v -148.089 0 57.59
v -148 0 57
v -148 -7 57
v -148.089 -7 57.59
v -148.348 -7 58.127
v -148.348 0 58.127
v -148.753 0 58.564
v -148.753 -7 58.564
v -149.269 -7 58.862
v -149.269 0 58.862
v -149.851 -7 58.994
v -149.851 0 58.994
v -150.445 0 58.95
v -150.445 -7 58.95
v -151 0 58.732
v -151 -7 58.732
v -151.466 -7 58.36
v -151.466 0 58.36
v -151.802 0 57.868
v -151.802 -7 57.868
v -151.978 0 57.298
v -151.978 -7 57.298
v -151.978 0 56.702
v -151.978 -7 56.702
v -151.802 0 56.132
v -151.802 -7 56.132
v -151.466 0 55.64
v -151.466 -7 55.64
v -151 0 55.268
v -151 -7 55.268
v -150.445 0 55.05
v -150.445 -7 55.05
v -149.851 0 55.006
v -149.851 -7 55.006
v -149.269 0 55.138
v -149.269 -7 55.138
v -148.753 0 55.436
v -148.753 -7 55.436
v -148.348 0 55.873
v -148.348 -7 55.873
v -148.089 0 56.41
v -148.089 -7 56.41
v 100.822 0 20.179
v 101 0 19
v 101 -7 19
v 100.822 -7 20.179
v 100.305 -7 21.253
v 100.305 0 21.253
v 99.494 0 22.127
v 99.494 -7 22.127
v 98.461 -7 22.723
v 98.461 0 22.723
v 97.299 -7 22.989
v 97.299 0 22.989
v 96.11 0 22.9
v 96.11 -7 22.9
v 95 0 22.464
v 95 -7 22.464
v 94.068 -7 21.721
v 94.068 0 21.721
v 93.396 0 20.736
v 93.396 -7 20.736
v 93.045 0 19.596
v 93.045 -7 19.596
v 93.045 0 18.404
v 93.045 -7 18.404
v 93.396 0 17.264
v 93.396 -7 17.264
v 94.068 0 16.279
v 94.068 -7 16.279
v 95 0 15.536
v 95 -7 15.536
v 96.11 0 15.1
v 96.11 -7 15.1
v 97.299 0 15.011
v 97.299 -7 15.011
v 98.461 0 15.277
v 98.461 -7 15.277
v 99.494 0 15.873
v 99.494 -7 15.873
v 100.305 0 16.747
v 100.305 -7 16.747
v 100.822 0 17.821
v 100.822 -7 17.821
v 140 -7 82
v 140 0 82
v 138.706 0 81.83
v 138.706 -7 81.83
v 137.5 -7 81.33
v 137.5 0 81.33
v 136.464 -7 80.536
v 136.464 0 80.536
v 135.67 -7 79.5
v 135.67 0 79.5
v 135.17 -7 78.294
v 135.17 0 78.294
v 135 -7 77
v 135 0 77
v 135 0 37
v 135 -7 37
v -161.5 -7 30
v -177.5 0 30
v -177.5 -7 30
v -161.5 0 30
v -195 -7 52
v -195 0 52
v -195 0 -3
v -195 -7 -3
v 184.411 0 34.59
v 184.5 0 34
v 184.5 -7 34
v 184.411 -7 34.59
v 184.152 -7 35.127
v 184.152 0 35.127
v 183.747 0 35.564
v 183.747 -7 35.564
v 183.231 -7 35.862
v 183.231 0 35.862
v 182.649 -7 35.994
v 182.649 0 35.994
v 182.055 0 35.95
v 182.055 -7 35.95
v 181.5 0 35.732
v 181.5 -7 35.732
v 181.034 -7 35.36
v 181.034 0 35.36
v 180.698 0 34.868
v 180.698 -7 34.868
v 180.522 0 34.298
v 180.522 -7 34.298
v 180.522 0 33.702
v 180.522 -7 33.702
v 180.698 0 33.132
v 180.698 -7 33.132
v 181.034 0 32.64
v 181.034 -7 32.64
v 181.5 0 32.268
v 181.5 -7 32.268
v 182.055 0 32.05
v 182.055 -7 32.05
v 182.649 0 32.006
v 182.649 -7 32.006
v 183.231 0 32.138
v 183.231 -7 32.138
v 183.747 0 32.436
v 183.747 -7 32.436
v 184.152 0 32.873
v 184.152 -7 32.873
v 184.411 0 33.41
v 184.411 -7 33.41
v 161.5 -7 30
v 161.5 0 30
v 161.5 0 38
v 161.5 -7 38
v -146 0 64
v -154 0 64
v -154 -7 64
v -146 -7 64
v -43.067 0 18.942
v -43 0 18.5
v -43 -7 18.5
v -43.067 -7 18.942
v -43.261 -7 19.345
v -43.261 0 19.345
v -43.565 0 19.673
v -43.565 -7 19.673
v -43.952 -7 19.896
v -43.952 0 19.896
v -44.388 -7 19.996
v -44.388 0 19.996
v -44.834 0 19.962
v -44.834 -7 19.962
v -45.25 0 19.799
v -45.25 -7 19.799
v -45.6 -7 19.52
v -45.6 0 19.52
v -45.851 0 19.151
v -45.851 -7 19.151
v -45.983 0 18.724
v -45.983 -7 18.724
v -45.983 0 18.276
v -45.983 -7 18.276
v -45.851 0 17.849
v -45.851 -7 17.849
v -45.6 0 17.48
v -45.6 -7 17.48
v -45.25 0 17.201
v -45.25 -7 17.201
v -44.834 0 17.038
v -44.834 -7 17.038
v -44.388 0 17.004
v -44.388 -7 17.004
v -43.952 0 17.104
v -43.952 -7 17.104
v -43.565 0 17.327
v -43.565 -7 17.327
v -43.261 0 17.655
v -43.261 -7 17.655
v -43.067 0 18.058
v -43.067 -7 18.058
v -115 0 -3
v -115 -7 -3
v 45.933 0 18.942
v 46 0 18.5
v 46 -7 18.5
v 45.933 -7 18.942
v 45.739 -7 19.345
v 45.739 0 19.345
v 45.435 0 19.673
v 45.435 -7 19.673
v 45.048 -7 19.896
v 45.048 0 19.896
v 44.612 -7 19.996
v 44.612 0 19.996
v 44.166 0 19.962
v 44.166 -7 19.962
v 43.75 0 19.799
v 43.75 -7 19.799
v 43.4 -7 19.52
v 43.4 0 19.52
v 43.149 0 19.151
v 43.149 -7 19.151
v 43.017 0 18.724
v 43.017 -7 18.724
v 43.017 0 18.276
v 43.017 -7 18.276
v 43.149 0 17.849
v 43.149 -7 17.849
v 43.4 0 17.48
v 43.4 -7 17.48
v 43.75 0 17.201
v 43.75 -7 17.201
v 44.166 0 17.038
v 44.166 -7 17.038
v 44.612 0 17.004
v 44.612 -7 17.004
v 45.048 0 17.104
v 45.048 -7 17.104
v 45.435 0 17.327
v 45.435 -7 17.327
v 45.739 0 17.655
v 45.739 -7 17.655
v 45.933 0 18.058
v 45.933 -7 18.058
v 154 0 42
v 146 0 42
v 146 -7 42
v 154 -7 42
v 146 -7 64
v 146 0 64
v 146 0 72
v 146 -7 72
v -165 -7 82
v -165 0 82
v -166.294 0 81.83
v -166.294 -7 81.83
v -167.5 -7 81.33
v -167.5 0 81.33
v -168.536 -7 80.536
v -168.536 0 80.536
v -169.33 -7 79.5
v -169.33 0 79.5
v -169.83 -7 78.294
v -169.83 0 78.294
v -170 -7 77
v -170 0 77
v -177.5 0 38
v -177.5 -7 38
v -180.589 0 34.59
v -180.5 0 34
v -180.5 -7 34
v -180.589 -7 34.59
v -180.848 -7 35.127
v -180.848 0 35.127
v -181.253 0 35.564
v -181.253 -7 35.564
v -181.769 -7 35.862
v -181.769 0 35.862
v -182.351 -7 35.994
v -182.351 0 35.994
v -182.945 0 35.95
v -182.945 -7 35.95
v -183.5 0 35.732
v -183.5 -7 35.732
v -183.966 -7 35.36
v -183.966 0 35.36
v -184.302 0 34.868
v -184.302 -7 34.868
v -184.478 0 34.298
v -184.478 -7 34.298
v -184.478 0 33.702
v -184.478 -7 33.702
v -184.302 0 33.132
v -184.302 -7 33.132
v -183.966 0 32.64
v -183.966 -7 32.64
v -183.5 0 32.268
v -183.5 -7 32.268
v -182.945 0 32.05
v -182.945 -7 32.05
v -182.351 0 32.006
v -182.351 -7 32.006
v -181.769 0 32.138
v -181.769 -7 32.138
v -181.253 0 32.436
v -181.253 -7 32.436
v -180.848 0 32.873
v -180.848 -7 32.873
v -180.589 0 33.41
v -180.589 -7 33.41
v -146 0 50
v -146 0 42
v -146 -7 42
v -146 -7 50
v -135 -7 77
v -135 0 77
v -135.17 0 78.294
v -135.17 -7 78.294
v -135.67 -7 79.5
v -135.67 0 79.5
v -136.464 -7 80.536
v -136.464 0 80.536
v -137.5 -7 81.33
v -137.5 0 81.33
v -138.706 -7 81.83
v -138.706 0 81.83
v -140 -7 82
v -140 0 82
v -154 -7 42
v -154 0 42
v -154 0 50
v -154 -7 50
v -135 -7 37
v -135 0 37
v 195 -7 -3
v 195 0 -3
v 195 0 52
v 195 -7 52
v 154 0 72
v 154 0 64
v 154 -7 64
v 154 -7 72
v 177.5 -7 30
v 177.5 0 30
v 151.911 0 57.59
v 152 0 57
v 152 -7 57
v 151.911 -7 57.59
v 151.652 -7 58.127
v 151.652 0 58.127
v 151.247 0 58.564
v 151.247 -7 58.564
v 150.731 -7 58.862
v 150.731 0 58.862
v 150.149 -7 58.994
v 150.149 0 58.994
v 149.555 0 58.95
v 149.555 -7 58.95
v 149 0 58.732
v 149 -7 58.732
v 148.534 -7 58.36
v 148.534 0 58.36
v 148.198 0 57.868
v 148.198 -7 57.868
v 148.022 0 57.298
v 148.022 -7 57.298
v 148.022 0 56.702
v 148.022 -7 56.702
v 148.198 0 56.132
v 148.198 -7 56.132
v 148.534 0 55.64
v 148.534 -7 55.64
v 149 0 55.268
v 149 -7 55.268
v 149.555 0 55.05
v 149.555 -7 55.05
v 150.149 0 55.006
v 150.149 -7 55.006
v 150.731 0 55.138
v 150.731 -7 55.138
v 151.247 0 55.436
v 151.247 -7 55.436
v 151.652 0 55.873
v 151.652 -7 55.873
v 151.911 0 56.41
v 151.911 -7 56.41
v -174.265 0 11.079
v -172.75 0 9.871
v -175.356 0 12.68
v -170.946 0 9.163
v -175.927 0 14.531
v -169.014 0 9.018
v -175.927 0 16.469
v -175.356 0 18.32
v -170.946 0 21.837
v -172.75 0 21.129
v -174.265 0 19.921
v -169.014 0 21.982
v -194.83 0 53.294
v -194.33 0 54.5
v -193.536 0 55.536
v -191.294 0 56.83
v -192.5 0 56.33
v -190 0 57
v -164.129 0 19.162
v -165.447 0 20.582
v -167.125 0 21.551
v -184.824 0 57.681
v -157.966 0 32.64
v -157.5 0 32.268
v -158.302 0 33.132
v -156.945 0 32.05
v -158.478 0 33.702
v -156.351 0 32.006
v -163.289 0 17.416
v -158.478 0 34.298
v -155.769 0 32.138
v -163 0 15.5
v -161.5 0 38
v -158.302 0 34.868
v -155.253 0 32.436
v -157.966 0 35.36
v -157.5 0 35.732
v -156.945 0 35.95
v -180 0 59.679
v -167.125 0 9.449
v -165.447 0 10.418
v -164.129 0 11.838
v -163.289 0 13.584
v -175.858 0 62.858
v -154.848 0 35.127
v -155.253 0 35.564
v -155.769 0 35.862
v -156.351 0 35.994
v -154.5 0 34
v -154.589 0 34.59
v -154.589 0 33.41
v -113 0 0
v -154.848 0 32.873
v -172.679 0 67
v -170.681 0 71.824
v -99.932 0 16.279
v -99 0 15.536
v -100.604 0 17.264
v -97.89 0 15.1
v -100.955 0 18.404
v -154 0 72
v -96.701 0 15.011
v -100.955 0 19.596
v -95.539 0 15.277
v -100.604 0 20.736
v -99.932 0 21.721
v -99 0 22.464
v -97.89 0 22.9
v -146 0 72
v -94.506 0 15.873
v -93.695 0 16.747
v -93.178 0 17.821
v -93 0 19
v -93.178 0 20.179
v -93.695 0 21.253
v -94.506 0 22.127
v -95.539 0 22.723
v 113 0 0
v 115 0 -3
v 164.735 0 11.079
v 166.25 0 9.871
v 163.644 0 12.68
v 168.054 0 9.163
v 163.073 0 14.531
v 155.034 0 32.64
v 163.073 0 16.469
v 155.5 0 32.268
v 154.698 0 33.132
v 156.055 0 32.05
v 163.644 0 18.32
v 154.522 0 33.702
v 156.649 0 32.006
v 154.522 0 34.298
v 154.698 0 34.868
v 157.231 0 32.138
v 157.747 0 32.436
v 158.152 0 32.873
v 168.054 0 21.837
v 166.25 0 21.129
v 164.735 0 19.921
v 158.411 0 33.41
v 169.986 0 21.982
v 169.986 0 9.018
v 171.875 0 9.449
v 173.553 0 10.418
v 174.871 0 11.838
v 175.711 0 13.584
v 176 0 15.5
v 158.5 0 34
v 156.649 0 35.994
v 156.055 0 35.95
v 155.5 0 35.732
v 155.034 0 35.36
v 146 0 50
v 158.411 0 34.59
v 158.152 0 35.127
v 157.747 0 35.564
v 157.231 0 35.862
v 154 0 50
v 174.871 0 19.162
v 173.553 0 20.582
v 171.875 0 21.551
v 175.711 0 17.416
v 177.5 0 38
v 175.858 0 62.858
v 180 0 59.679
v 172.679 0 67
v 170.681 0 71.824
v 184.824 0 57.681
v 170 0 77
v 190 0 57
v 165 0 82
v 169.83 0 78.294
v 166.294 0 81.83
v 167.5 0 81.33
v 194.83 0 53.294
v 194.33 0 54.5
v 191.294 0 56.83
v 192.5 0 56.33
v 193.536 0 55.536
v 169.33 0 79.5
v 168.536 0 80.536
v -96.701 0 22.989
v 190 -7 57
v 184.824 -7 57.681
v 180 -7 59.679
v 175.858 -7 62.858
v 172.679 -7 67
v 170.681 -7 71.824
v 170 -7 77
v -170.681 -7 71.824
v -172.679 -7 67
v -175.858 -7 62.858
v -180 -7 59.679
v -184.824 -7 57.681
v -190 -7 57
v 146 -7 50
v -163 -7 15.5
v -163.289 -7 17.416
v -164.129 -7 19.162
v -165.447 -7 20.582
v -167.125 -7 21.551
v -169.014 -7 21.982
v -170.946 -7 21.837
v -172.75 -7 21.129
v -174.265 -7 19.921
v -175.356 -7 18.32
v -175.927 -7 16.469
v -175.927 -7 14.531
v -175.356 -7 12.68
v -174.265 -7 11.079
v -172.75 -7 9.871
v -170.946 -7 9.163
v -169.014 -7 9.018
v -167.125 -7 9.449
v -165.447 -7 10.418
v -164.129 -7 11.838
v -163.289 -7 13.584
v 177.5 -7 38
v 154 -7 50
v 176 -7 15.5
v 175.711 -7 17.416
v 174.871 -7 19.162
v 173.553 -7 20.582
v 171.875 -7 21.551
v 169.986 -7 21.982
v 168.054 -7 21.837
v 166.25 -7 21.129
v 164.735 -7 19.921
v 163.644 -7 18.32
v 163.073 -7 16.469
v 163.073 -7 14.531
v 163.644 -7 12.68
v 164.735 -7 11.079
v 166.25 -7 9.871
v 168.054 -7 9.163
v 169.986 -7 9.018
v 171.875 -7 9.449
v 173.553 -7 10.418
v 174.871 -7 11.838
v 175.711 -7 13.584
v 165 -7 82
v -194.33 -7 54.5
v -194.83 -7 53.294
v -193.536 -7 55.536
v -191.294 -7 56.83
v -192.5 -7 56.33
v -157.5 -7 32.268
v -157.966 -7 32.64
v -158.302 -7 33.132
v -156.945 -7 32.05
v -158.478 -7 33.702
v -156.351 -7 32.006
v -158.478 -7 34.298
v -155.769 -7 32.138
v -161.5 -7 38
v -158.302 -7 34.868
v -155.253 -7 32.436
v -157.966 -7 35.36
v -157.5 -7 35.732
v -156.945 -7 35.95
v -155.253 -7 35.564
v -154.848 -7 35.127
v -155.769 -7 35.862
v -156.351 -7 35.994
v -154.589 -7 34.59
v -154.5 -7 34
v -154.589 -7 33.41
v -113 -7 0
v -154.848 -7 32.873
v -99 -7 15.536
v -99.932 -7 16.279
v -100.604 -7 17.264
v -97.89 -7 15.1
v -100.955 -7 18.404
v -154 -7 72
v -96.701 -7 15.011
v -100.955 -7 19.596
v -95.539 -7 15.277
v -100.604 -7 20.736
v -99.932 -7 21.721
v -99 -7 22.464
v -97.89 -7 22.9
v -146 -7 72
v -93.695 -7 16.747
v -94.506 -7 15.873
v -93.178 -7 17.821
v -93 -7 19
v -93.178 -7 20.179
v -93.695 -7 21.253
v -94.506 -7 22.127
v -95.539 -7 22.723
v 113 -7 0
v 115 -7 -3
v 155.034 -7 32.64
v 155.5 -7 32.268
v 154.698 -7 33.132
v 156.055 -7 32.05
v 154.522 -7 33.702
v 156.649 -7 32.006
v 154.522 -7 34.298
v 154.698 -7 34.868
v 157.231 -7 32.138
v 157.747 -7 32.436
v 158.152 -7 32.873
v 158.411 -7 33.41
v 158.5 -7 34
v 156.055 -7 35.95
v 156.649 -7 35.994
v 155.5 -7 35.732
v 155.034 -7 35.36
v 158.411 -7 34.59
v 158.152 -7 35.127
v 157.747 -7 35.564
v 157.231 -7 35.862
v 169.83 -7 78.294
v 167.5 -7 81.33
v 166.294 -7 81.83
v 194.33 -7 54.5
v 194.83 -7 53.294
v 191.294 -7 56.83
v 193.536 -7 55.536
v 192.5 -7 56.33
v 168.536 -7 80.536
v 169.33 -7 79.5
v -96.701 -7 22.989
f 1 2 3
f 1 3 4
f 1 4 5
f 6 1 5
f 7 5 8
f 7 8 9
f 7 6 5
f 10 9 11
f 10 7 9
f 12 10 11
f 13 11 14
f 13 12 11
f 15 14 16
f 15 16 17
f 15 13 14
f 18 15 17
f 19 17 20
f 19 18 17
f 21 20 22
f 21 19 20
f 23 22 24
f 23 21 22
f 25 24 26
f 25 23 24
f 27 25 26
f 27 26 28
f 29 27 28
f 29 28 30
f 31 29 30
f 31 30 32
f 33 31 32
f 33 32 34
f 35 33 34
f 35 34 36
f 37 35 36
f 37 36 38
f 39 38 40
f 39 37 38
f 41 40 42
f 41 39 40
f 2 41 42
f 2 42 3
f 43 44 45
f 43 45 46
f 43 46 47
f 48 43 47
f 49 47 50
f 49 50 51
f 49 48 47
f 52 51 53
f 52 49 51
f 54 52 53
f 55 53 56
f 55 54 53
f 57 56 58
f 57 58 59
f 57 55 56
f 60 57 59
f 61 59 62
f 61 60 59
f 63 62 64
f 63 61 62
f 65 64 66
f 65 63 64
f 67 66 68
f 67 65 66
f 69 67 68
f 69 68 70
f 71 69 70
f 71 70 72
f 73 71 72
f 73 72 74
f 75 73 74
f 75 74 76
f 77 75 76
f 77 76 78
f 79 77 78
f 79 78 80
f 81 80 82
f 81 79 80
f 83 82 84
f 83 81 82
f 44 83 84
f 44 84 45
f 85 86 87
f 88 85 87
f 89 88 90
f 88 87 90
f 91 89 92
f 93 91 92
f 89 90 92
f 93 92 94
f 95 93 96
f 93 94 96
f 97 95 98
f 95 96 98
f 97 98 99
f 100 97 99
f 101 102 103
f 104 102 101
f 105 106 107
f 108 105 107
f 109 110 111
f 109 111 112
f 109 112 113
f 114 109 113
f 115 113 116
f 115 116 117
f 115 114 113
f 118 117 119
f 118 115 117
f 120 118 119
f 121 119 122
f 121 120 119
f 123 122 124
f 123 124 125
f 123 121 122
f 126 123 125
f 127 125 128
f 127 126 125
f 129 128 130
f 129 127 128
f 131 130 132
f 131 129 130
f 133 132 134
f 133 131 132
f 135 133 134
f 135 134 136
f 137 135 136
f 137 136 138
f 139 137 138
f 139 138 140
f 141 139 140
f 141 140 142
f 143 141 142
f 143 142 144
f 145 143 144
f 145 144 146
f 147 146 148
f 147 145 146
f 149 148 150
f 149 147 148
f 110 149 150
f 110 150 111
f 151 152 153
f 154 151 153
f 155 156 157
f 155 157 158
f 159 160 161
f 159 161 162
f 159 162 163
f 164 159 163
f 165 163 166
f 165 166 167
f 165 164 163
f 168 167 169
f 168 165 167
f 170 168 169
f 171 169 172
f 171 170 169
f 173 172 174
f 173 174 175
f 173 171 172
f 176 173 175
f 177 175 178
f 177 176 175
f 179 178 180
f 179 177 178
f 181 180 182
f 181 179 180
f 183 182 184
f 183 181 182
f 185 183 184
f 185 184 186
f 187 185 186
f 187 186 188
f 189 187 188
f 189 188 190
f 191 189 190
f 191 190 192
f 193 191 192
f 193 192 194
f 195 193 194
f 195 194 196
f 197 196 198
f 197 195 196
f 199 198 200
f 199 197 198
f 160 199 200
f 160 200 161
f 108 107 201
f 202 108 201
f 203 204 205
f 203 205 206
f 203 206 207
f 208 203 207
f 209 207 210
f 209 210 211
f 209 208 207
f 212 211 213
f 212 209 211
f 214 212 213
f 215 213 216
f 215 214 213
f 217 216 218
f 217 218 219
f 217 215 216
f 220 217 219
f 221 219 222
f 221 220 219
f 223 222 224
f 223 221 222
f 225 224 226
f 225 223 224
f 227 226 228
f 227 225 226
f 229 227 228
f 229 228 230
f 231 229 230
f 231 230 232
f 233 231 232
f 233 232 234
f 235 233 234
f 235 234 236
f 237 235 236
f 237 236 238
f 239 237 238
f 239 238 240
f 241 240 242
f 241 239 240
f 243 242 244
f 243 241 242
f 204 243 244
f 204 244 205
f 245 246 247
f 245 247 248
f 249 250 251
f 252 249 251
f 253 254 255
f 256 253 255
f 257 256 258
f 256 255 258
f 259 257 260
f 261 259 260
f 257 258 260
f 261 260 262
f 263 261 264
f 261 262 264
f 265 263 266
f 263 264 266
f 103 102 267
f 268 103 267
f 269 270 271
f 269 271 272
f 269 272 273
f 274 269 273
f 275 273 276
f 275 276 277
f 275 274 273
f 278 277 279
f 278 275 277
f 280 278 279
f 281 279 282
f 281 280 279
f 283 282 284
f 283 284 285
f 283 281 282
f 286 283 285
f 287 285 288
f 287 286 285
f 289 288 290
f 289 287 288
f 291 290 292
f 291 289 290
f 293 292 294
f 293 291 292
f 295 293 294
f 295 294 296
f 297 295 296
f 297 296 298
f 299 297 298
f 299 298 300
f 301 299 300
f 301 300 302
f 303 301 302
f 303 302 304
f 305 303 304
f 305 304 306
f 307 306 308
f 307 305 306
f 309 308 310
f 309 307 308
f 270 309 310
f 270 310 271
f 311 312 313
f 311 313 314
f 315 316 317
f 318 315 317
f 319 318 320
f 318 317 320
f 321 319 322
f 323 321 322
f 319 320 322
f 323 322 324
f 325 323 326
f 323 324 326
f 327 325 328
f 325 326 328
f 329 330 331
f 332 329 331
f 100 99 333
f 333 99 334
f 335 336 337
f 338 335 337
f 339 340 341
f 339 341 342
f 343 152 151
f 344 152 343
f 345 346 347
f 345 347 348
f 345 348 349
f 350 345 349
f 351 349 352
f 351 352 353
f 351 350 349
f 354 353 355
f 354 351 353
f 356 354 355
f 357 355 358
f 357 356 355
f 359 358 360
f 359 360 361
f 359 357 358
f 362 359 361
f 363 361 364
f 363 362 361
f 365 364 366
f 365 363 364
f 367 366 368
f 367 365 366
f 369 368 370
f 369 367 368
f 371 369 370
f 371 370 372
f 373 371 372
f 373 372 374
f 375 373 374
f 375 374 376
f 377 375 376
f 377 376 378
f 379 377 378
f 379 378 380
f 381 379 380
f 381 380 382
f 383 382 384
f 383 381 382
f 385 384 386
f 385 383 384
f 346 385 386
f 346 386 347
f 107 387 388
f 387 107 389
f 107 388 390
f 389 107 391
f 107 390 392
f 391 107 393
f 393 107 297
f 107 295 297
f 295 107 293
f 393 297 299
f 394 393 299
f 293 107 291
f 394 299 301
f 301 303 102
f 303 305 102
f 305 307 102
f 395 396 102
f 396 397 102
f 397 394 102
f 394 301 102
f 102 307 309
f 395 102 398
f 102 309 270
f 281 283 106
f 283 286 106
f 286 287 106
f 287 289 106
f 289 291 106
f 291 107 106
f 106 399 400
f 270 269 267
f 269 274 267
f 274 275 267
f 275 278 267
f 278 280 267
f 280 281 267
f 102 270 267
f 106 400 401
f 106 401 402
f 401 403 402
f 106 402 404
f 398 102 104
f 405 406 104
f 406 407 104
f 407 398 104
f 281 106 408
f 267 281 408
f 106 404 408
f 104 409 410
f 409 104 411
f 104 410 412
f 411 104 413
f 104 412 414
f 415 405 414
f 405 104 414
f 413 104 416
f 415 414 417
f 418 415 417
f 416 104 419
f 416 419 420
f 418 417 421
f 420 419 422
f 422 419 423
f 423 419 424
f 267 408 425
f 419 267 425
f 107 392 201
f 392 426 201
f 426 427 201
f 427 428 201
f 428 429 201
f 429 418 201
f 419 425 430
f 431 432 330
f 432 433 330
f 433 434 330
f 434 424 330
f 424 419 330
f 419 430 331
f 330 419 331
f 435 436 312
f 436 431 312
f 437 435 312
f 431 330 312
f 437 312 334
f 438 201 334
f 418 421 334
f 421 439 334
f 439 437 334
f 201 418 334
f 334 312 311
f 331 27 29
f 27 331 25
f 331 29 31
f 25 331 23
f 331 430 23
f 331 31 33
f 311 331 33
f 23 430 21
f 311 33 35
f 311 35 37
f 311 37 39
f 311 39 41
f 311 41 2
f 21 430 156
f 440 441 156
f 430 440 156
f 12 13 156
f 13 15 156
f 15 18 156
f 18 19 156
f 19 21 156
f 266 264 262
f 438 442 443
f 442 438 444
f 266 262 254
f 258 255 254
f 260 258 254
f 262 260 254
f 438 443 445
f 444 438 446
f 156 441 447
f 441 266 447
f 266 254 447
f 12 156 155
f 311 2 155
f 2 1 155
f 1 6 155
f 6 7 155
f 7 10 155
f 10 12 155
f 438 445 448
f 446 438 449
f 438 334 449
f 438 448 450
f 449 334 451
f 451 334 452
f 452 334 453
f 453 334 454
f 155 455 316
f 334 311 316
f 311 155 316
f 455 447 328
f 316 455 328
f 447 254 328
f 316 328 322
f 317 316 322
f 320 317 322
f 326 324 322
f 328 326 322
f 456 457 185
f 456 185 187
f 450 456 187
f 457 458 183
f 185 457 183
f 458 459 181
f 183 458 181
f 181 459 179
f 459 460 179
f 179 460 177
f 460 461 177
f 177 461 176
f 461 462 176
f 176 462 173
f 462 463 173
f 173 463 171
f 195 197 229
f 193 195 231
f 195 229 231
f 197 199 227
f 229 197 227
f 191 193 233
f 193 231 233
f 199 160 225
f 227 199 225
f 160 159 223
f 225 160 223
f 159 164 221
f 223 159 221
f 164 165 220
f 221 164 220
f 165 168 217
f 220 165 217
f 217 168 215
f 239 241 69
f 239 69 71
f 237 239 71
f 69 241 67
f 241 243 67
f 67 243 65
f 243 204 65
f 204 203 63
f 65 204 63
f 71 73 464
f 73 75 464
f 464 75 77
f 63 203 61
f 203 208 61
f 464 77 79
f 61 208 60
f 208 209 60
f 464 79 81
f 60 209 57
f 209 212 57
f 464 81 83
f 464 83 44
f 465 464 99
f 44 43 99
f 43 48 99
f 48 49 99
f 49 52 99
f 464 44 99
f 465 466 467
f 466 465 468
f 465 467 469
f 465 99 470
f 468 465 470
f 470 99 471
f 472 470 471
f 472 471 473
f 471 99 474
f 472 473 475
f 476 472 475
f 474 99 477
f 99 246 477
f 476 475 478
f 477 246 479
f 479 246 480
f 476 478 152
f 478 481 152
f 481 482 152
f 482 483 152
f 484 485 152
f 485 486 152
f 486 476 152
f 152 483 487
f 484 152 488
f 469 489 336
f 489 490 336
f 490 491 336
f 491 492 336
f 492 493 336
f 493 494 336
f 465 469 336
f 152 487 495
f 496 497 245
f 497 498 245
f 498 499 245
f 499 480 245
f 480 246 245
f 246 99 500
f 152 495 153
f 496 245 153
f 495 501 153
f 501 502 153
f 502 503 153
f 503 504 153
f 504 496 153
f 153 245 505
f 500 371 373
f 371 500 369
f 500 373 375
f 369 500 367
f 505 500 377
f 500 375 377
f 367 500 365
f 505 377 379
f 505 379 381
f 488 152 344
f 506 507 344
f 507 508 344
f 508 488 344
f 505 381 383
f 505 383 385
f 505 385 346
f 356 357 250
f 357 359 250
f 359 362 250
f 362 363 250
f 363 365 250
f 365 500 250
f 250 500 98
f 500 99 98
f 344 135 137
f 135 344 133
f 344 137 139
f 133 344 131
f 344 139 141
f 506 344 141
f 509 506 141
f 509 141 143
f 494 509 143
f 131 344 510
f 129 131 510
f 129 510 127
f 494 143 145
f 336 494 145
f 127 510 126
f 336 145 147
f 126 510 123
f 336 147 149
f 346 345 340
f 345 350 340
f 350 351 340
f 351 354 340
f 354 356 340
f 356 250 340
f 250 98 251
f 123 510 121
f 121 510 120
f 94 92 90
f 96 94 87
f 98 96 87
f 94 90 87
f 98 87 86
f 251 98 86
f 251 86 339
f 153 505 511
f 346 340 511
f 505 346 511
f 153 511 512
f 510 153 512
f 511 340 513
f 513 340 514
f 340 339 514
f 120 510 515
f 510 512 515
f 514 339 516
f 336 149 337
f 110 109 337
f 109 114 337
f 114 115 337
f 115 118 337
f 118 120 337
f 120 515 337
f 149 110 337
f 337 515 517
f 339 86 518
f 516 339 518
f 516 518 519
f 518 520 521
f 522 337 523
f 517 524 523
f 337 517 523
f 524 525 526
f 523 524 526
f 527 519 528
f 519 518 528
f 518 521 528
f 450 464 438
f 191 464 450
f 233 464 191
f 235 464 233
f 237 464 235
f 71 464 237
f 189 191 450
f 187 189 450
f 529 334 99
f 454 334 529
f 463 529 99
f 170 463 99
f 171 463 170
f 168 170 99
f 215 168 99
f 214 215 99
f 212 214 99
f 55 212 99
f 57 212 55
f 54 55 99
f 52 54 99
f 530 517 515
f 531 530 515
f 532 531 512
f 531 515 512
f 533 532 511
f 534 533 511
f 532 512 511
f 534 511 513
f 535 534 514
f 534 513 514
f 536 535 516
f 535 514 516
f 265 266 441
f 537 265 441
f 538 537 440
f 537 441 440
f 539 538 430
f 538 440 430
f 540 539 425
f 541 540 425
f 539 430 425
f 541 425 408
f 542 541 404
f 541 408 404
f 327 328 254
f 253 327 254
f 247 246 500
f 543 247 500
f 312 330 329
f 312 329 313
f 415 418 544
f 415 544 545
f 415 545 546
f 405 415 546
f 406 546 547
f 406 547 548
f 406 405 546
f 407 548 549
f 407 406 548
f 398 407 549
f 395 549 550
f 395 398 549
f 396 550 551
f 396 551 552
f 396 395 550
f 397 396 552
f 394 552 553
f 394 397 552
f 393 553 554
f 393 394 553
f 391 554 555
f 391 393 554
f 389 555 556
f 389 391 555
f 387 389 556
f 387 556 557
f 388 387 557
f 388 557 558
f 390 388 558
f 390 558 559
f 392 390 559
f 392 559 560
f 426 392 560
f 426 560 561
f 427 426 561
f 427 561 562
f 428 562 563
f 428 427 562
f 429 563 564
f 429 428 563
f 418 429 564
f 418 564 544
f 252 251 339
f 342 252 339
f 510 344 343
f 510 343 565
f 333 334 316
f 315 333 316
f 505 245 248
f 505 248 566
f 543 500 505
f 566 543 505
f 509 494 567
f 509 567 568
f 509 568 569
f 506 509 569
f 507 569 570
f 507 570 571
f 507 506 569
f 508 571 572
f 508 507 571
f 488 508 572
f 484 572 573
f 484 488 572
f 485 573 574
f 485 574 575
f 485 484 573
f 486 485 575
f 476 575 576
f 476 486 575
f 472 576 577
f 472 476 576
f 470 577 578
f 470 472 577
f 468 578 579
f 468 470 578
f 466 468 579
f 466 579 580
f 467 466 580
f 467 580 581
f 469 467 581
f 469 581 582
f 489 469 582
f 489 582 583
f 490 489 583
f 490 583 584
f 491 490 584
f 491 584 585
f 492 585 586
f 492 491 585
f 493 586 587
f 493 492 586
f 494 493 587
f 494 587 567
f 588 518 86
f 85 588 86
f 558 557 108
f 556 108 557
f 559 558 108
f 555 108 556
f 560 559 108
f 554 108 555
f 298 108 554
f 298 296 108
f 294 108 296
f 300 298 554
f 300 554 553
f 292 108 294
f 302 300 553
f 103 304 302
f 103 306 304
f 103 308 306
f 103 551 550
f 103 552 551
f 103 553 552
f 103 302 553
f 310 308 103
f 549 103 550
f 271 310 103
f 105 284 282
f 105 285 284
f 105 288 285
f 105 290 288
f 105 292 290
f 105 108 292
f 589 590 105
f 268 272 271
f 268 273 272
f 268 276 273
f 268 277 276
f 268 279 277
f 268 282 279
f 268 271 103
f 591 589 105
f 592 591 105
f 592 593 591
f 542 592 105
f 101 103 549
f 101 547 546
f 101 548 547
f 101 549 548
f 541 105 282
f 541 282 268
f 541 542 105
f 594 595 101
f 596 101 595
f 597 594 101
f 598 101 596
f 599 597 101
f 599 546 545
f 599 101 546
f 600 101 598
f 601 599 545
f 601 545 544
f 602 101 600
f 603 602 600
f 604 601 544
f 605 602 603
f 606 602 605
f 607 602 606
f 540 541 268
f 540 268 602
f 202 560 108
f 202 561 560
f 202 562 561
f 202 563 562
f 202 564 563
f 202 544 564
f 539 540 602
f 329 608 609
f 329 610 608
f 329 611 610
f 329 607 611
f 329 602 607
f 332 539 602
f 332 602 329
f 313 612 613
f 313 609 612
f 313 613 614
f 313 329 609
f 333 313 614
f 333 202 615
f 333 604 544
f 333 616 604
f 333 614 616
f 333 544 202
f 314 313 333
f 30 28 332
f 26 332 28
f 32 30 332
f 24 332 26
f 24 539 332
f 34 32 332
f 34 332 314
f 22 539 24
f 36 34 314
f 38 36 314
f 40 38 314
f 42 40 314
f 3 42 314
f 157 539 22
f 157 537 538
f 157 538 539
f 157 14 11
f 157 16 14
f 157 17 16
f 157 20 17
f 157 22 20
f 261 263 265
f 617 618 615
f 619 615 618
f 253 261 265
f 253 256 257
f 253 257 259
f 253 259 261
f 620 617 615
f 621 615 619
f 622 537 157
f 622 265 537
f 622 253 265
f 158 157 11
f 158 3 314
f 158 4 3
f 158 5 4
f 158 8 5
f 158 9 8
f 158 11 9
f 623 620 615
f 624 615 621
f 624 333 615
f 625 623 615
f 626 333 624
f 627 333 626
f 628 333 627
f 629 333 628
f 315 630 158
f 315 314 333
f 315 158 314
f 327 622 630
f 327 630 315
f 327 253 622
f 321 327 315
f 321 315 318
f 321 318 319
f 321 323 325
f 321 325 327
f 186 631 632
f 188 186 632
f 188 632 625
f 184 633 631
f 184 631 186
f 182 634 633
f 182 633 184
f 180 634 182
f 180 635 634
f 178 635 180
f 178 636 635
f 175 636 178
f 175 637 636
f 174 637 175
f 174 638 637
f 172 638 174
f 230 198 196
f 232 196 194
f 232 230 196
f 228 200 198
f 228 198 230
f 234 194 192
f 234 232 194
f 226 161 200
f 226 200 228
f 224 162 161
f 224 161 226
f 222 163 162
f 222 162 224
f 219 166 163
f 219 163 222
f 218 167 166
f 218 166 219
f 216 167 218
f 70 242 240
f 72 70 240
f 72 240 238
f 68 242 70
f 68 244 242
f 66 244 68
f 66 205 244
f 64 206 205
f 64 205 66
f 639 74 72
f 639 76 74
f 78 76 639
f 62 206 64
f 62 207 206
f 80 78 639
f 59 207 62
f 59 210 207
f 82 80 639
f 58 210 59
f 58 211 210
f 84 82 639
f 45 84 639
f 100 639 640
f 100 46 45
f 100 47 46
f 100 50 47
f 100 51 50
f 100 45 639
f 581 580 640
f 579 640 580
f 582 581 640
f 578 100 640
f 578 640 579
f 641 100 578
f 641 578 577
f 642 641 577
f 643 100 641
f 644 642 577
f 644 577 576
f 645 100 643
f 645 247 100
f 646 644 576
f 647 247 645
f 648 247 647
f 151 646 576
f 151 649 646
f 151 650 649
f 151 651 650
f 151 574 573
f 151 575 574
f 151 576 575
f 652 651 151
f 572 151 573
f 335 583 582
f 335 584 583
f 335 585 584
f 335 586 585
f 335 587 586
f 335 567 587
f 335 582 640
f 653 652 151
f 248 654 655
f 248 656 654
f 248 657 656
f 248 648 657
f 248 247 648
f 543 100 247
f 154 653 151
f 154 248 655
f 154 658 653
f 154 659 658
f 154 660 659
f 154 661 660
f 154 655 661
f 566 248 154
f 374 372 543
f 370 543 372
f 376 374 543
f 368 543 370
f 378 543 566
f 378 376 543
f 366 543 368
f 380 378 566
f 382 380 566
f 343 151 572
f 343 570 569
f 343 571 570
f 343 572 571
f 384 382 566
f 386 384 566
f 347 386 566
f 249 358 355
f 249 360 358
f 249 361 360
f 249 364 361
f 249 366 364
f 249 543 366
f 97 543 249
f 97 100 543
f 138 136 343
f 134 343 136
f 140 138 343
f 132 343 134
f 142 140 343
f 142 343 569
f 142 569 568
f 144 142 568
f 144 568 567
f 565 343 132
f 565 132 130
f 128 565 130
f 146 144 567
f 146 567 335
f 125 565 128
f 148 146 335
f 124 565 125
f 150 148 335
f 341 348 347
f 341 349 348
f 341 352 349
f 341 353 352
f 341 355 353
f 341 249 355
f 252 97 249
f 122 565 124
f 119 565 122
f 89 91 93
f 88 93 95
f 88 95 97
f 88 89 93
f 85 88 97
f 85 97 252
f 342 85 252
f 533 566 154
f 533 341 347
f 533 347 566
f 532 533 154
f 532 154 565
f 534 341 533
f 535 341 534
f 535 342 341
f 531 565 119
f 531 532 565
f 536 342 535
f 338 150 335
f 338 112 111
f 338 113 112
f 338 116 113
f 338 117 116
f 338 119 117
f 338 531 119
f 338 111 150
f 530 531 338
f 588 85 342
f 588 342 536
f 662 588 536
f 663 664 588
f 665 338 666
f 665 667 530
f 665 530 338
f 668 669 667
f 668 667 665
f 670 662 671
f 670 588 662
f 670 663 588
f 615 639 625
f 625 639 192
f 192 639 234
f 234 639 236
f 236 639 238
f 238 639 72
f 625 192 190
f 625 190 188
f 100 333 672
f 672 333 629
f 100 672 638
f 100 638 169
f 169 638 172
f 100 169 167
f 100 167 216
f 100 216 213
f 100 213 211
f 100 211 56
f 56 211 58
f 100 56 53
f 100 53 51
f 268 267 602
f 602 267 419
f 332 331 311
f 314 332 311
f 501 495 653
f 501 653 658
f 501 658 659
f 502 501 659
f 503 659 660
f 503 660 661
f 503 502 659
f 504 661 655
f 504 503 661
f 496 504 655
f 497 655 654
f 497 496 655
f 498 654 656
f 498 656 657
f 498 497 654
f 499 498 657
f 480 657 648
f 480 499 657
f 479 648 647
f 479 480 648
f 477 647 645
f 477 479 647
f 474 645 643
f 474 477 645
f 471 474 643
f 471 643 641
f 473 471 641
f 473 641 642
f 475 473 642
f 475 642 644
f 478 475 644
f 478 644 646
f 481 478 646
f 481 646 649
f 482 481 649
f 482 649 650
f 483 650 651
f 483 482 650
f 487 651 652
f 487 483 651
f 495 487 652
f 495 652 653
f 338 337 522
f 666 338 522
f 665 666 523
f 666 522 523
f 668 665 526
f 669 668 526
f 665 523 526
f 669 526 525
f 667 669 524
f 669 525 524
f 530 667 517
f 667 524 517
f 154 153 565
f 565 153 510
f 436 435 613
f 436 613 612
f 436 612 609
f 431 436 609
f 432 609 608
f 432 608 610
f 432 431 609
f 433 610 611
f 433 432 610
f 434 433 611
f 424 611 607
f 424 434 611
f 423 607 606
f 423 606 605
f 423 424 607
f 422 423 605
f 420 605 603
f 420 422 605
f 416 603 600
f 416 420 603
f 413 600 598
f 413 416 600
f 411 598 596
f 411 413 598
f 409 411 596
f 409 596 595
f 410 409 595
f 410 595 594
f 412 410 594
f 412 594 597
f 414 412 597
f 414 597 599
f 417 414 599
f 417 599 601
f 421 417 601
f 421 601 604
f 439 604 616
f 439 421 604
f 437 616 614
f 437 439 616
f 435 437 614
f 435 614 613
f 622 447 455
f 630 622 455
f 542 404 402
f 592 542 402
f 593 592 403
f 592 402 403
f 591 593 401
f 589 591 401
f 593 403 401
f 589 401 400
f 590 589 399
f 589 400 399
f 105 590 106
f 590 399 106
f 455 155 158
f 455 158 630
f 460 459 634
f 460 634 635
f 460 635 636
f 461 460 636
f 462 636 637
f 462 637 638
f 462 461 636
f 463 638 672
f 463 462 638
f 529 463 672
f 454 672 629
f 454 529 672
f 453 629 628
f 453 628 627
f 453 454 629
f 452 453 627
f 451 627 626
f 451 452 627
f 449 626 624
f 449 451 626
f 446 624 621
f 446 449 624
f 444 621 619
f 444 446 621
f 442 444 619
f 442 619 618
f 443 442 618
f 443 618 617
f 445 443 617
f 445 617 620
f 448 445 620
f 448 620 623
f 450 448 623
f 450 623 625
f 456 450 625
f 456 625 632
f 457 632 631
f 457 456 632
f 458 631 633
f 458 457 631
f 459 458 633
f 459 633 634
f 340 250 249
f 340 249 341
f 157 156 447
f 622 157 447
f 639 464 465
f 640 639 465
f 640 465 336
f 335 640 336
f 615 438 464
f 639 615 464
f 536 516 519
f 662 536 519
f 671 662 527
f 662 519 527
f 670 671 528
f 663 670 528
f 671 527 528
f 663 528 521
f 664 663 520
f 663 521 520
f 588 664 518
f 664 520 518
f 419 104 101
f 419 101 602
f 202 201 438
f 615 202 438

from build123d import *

# Parameters (mm, degrees)
F0_R     = 6.5
F0_R_2   = 2
F0_W     = 16
F0_H     = 8
F0_R_3   = 4
F0_R_4   = 1.5
F0_W_2   = 8
F1_DEPTH = 7


with BuildPart() as f1:
    # F0 (on Front) → F1 (new body)
    with BuildSketch(Plane.XZ):
        with BuildLine():
            Line((-113, 0), (0, 0))
            Line((0, 0), (113, 0))
            Line((113, 0), (115, -3))
            Line((115, -3), (195, -3))
            Line((195, -3), (195, 52))
            ThreePointArc((195, 52), (193.535534, 55.535534), (190, 57))
            ThreePointArc((190, 57), (175.857864, 62.857864), (170, 77))
            ThreePointArc((170, 77), (168.535534, 80.535534), (165, 82))
            Line((165, 82), (140, 82))
            ThreePointArc((140, 82), (136.464466, 80.535534), (135, 77))
            Line((135, 77), (135, 46.753148))
            Line((135, 46.753148), (135, 37))
            Line((135, 37), (0, 37))
            Line((0, 37), (-135, 37))
            Line((-135, 37), (-135, 46.753148))
            Line((-135, 46.753148), (-135, 77))
            ThreePointArc((-135, 77), (-136.464466, 80.535534), (-140, 82))
            Line((-140, 82), (-165, 82))
            ThreePointArc((-165, 82), (-168.535534, 80.535534), (-170, 77))
            ThreePointArc((-170, 77), (-175.857864, 62.857864), (-190, 57))
            ThreePointArc((-190, 57), (-193.535534, 55.535534), (-195, 52))
            Line((-195, 52), (-195, -3))
            Line((-195, -3), (-115, -3))
            Line((-115, -3), (-113, 0))
        make_face()
        with Locations((-169.5, 15.5)):
            Circle(F0_R, mode=Mode.SUBTRACT)
        with Locations((-182.5, 34)):
            Circle(F0_R_2, mode=Mode.SUBTRACT)
        with Locations((-169.5, 34)):
            Rectangle(F0_W, F0_H, mode=Mode.SUBTRACT)
        with Locations((-156.5, 34)):
            Circle(F0_R_2, mode=Mode.SUBTRACT)
        with Locations((-97, 19)):
            Circle(F0_R_3, mode=Mode.SUBTRACT)
        with Locations((-44.5, 18.5)):
            Circle(F0_R_4, mode=Mode.SUBTRACT)
        with Locations((169.5, 15.5)):
            Circle(F0_R, mode=Mode.SUBTRACT)
        with Locations((44.5, 18.5)):
            Circle(F0_R_4, mode=Mode.SUBTRACT)
        with Locations((97, 19)):
            Circle(F0_R_3, mode=Mode.SUBTRACT)
        with Locations((156.5, 34)):
            Circle(F0_R_2, mode=Mode.SUBTRACT)
        with Locations((169.5, 34)):
            Rectangle(F0_W, F0_H, mode=Mode.SUBTRACT)
        with Locations((182.5, 34)):
            Circle(F0_R_2, mode=Mode.SUBTRACT)
        with Locations((-150, 46)):
            Rectangle(F0_W_2, F0_H, mode=Mode.SUBTRACT)
        with Locations((-150, 57)):
            Circle(F0_R_2, mode=Mode.SUBTRACT)
        with Locations((-150, 68)):
            Rectangle(F0_W_2, F0_H, mode=Mode.SUBTRACT)
        with Locations((150, 46)):
            Rectangle(F0_W_2, F0_H, mode=Mode.SUBTRACT)
        with Locations((150, 57)):
            Circle(F0_R_2, mode=Mode.SUBTRACT)
        with Locations((150, 68)):
            Rectangle(F0_W_2, F0_H, mode=Mode.SUBTRACT)
    extrude(amount=F1_DEPTH)


solid = f1.part
